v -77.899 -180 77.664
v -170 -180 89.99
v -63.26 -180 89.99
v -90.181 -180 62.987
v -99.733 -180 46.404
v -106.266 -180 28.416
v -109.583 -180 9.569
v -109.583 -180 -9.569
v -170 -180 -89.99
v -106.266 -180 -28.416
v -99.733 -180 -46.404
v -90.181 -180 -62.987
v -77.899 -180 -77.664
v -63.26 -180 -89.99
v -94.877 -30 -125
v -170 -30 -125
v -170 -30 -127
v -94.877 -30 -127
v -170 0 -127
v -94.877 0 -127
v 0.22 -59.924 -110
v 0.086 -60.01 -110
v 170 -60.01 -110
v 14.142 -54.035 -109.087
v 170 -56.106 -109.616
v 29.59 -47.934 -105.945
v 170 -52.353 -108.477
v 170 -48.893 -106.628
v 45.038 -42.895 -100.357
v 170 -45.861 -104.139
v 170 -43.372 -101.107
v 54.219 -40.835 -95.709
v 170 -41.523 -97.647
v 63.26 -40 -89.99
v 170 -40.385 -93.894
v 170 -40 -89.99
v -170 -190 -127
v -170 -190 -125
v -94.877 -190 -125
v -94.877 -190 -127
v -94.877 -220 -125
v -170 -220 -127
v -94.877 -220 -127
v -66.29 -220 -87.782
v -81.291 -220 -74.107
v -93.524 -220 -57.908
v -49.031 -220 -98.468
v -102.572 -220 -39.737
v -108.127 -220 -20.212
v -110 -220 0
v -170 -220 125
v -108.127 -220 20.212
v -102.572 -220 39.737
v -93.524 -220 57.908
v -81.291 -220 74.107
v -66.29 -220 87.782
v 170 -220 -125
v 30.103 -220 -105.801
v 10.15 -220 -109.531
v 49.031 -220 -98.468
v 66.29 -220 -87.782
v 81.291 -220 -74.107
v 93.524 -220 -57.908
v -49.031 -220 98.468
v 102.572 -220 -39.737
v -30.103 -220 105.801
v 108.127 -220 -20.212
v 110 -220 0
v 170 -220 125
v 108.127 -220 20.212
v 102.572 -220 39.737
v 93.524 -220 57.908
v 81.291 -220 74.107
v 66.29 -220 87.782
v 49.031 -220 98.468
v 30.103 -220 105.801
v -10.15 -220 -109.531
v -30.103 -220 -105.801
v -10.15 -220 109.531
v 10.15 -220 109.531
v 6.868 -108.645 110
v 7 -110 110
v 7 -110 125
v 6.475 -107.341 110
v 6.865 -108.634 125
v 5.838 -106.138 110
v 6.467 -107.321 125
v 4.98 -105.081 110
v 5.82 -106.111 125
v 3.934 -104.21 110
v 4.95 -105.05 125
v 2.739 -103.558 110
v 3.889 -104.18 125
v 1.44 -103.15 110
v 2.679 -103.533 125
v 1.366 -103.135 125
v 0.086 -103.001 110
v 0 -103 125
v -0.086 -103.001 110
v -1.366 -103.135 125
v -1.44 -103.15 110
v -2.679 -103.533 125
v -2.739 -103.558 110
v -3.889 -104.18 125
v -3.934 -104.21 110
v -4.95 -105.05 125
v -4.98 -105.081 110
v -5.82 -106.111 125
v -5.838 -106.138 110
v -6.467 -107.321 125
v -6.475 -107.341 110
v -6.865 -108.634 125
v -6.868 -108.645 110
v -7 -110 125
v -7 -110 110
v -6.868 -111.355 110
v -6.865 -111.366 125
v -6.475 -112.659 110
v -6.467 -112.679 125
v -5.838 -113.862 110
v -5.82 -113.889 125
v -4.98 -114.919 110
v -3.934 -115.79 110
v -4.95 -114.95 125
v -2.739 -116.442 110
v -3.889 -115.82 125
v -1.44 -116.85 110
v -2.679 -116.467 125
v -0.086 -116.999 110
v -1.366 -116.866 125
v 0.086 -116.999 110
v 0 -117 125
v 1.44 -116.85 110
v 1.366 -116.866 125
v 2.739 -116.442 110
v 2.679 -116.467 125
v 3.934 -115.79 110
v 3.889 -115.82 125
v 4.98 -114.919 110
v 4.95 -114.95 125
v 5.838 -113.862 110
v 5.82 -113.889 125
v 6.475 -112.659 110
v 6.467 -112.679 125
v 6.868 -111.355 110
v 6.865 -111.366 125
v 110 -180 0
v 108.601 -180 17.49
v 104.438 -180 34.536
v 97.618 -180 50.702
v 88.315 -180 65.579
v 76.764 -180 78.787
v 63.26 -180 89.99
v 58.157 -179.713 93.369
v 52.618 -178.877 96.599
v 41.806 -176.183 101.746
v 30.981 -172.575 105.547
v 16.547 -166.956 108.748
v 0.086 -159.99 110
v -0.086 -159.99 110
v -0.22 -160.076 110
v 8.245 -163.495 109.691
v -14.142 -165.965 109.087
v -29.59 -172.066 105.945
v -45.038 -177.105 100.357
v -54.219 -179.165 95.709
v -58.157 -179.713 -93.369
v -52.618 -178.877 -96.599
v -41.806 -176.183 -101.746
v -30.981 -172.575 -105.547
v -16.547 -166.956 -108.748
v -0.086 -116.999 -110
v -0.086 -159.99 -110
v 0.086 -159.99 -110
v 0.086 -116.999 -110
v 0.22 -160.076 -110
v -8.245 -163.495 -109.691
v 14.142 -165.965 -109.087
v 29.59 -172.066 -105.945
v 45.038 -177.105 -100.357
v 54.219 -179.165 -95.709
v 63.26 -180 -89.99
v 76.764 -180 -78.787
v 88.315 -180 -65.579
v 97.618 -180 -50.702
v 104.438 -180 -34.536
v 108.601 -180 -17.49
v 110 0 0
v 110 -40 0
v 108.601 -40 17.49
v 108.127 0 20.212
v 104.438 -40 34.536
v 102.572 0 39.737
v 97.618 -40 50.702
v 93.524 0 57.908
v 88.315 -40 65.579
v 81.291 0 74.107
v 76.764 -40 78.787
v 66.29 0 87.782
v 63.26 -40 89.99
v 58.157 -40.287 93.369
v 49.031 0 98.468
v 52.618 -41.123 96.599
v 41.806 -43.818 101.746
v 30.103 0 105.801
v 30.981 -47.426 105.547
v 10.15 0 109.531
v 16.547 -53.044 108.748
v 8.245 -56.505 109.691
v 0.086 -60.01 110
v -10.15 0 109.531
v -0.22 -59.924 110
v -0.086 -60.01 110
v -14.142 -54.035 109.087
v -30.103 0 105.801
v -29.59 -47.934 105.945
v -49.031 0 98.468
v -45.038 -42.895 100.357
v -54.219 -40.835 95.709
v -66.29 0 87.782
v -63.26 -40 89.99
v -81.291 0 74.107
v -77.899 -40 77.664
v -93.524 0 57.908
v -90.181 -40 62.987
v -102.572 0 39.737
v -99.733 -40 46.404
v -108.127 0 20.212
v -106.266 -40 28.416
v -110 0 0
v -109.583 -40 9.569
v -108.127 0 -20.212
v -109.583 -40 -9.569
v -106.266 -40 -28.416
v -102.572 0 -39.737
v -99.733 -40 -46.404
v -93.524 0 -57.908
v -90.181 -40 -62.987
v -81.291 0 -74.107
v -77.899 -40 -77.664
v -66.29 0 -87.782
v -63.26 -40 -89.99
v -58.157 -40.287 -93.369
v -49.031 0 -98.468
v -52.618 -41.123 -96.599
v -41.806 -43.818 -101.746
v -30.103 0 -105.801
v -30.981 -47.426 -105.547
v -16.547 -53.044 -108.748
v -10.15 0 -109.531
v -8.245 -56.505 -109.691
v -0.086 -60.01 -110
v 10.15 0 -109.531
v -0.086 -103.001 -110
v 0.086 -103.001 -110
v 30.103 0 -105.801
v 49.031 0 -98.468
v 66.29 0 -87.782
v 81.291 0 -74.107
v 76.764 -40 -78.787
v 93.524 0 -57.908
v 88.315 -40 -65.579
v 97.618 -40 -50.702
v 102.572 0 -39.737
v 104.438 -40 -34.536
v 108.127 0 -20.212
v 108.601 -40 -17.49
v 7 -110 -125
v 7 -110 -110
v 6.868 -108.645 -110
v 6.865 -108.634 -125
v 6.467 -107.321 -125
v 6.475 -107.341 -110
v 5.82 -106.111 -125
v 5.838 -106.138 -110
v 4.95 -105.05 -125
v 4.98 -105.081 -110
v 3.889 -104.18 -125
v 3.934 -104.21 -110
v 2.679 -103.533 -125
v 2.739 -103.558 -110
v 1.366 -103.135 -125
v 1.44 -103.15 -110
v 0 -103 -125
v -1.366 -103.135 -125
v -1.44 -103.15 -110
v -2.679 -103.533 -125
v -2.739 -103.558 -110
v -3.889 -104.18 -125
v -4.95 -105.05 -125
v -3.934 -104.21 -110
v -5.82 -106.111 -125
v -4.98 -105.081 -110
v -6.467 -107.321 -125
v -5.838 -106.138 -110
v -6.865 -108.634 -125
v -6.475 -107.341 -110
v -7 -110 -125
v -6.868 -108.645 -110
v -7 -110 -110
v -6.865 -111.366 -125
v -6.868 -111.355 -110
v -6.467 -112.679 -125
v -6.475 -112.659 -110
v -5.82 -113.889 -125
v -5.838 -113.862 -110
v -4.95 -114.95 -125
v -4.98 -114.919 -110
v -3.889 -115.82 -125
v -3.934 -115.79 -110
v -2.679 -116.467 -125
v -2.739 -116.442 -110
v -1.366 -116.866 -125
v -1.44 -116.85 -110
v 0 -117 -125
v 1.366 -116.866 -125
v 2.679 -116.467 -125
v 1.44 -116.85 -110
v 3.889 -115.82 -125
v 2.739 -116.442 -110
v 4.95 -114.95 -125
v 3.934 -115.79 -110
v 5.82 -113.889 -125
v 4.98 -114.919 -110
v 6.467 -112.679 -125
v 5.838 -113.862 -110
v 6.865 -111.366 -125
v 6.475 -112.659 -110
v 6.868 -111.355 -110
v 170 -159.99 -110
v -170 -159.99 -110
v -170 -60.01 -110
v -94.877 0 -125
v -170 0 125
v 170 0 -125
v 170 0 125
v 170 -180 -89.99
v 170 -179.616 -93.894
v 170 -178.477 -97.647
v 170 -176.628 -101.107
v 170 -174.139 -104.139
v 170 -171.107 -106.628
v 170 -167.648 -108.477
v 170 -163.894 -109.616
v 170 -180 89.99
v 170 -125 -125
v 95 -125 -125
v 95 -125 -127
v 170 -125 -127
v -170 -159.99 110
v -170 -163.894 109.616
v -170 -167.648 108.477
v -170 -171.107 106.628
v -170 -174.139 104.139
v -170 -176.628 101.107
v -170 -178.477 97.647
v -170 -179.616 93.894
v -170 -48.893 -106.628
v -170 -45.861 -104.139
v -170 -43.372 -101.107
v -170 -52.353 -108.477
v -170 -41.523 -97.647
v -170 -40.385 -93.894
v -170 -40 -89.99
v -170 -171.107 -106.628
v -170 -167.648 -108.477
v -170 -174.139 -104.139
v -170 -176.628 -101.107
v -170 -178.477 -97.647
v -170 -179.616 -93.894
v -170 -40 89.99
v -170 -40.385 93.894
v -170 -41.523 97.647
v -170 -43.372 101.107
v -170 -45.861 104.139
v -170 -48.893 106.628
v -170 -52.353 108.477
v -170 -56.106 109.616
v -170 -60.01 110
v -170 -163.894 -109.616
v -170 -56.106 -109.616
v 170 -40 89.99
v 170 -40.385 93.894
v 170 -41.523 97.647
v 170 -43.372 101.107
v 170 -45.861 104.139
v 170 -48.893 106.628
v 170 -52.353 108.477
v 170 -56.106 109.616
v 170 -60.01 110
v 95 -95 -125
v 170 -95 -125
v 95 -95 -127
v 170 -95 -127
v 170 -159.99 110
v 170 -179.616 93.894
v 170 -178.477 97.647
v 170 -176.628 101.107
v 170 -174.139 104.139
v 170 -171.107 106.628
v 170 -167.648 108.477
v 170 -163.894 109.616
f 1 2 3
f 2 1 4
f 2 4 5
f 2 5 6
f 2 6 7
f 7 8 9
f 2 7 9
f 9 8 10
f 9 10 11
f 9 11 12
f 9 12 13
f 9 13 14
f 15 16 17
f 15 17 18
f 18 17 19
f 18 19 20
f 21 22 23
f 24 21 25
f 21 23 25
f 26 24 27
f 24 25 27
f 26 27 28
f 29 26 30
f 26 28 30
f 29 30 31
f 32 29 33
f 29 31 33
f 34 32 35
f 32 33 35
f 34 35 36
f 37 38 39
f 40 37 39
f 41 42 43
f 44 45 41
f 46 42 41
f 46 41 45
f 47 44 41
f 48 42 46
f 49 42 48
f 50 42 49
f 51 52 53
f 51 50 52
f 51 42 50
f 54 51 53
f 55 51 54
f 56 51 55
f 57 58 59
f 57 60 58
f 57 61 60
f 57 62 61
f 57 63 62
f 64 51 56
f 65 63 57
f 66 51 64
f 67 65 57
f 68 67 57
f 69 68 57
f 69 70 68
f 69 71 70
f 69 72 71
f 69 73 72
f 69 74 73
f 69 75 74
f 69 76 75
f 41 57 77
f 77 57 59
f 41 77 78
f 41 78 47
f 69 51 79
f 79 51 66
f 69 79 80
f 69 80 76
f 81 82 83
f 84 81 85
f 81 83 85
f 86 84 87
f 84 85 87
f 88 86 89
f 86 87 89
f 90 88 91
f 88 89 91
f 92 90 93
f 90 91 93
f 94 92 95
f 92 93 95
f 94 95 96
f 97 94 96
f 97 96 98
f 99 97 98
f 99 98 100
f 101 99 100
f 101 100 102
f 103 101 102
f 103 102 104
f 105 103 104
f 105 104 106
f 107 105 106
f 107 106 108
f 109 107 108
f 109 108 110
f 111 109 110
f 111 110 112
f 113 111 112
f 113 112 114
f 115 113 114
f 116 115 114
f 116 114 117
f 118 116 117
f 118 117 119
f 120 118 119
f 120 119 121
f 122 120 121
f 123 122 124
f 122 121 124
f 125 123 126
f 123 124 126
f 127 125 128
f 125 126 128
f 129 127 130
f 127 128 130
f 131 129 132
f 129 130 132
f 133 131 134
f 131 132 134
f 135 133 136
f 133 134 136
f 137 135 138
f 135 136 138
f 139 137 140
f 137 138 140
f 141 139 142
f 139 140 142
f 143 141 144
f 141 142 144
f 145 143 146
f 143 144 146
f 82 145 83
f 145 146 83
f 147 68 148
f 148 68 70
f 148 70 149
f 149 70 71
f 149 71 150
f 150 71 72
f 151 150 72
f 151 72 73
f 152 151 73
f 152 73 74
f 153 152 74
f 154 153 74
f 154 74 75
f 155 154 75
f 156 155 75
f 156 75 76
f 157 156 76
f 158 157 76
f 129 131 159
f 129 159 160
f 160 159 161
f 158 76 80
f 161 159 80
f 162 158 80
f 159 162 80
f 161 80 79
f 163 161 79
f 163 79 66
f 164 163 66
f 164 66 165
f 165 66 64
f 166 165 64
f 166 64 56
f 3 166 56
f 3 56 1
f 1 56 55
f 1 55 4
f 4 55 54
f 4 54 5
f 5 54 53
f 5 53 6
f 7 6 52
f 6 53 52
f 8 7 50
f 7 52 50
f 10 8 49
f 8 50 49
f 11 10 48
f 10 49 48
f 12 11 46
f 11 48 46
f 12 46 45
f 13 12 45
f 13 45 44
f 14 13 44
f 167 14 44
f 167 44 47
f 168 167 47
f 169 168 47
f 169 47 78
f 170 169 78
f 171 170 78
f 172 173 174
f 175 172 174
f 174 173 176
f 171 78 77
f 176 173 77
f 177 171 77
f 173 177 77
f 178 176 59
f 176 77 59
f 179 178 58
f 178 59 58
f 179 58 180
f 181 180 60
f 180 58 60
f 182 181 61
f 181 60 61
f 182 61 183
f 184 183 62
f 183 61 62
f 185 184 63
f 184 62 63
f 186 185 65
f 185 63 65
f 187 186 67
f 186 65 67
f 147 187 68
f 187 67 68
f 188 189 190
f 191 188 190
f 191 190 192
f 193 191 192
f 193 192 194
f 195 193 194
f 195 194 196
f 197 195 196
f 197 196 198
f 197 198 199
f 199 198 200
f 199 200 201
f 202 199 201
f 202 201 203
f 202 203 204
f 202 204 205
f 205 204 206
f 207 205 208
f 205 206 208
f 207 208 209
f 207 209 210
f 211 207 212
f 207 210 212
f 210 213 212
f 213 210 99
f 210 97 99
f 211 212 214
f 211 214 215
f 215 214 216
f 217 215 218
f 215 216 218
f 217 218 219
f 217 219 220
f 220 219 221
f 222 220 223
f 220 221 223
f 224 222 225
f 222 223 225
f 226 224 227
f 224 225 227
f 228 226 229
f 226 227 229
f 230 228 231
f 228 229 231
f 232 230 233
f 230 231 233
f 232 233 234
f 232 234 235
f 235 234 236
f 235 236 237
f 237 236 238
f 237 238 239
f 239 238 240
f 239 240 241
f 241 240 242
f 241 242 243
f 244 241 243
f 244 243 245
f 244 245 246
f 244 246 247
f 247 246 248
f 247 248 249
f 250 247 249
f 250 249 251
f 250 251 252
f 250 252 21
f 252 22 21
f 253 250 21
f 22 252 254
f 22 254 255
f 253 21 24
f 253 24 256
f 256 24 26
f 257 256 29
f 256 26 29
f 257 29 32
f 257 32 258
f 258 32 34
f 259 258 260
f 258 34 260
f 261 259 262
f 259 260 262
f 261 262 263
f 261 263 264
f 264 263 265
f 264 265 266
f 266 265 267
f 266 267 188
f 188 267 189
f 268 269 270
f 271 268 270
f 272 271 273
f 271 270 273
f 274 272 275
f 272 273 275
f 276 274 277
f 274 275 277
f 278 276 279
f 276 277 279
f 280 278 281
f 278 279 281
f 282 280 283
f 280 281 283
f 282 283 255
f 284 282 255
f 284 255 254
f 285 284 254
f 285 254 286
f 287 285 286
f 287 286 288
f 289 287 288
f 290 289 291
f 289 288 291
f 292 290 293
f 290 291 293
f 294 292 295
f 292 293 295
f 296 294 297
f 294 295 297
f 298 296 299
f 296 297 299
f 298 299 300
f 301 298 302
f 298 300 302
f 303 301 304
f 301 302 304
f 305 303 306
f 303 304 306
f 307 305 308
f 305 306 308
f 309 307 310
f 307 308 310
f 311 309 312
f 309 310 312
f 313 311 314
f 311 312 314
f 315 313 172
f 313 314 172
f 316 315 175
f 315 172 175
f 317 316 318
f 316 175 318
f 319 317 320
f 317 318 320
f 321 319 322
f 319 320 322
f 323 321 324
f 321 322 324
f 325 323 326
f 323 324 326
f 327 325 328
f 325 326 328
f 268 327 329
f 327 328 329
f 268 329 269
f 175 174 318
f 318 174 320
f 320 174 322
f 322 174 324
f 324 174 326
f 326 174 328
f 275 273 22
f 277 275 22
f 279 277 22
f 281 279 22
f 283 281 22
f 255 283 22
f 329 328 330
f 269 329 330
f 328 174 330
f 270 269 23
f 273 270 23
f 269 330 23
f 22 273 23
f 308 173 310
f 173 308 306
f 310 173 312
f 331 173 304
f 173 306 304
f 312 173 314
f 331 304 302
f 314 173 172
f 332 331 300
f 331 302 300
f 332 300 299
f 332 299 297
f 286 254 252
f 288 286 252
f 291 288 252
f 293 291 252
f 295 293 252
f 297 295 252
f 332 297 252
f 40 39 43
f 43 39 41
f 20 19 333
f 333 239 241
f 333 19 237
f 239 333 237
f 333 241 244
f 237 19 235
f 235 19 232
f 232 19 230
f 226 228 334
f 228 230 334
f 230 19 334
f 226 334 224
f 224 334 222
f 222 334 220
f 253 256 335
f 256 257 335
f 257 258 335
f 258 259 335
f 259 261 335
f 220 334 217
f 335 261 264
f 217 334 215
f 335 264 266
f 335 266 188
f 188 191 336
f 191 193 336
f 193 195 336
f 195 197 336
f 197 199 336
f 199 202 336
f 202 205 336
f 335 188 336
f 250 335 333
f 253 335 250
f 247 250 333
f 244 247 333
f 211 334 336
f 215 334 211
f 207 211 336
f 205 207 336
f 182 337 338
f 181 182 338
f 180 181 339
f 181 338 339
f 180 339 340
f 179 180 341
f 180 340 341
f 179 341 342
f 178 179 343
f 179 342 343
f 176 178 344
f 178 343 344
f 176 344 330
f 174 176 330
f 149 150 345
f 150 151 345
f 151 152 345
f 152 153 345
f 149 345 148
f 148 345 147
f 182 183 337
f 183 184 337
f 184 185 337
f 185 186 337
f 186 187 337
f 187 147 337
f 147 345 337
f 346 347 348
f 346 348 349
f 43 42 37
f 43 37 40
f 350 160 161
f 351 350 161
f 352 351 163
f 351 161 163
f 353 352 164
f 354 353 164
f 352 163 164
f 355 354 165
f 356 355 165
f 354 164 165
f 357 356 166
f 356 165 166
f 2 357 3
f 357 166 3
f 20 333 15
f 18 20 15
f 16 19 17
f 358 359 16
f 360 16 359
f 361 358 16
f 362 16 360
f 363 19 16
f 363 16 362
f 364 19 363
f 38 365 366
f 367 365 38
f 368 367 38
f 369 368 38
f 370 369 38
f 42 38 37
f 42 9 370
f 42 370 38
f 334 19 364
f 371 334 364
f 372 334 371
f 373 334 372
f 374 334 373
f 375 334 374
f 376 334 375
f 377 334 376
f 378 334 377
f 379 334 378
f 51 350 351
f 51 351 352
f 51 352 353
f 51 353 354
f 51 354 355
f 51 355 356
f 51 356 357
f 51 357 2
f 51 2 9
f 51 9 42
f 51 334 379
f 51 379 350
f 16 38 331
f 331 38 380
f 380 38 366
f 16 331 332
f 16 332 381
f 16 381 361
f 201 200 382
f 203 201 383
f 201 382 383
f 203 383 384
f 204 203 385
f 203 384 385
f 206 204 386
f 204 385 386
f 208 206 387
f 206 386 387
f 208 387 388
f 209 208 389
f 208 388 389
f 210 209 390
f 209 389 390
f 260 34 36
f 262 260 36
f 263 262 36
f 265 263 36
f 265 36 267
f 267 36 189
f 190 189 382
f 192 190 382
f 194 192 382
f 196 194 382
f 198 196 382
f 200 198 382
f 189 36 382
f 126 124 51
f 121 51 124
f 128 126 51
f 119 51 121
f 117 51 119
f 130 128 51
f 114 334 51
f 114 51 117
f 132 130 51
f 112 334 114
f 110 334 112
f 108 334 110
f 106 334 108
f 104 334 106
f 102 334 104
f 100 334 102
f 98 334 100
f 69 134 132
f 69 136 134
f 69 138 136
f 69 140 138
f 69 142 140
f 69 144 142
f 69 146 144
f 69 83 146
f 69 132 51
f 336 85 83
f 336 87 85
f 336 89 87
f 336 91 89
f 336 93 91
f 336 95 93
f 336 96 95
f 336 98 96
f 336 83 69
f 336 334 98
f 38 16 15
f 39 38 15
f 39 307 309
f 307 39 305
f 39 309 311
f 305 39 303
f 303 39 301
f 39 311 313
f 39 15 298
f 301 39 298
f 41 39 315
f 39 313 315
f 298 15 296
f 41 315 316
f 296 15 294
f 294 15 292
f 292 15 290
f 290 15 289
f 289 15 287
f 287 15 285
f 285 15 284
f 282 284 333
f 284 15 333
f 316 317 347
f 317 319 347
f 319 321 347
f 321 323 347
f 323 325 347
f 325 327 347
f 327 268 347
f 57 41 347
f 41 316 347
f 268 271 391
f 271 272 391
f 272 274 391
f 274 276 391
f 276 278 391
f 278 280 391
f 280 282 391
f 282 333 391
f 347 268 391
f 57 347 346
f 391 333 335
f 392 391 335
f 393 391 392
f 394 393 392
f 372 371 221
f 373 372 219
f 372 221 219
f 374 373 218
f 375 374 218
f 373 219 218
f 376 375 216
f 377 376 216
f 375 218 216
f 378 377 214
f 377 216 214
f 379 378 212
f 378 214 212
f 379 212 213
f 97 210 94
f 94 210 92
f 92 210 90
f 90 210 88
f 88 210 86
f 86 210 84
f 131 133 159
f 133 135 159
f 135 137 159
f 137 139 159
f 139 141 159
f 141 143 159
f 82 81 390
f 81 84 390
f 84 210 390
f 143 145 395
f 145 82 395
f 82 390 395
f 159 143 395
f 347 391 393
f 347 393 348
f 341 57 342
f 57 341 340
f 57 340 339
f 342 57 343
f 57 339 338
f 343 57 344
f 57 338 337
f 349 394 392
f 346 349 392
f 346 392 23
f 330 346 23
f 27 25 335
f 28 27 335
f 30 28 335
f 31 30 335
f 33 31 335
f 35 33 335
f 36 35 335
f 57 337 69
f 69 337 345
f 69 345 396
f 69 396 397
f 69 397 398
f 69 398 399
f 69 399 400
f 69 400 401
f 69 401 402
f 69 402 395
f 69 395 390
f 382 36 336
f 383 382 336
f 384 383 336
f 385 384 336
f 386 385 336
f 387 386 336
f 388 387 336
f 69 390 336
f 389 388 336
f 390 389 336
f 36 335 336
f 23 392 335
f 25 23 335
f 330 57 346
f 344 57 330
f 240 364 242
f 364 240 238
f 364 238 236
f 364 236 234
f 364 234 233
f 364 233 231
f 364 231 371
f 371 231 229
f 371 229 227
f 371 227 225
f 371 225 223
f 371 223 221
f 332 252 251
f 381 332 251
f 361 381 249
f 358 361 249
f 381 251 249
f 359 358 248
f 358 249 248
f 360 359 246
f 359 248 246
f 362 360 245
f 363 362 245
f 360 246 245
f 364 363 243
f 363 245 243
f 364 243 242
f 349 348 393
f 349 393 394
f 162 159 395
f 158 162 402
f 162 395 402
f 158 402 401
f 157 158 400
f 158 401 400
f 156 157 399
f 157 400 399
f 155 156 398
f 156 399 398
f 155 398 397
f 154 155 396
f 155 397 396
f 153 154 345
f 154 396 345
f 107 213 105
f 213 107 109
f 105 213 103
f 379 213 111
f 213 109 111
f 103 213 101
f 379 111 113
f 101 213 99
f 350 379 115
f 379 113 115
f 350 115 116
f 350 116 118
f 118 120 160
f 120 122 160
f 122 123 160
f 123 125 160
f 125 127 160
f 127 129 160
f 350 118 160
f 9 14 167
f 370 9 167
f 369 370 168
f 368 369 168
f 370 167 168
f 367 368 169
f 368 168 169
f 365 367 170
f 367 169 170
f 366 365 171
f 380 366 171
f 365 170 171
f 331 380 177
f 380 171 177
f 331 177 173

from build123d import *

# Parameters (mm, degrees)
F0_W      = 340
F0_H      = 250
F1_DEPTH  = 220
F3_DEPTH  = 340
F4_R      = 110.000034
F5_DEPTH  = 228.6
F6_R      = 6.999986
F7_DEPTH  = 304.8
F8_W      = 75.12304
F8_H      = 29.99994
F9_DEPTH  = 2
F10_W     = 75
F10_H     = 30
F11_DEPTH = 2


with BuildPart() as f1:
    # F0 (on Front) → F1 (new body)
    with BuildSketch(Plane.XZ):
        Rectangle(F0_W, F0_H)
    extrude(amount=F1_DEPTH)

    # F2 (on face) → F3 (cut)
    with BuildSketch(Plane.YZ.offset(170)):
        with BuildLine():
            ThreePointArc((-40.00008, 89.98988), (-45.860908, 104.139172), (-60.0102, 110))
            Line((-60.0102, 110), (-159.98996, 110))
            ThreePointArc((-159.98996, 110), (-174.139252, 104.139172), (-180.00008, 89.98988))
            Line((-180.00008, 89.98988), (-180.00008, -89.98988))
            ThreePointArc((-180.00008, -89.98988), (-174.139252, -104.139172), (-159.98996, -110))
            Line((-159.98996, -110), (-60.0102, -110))
            ThreePointArc((-60.0102, -110), (-45.860908, -104.139172), (-40.00008, -89.98988))
            Line((-40.00008, -89.98988), (-40.00008, 89.98988))
        make_face()
    extrude(amount=-F3_DEPTH, mode=Mode.SUBTRACT)

    # F4 (on face) → F5 (cut)
    with BuildSketch(Plane.XZ.offset(220)):
        Circle(F4_R)
    extrude(amount=-F5_DEPTH, mode=Mode.SUBTRACT)

    # F6 (on face) → F7 (cut)
    with BuildSketch(Plane.XY.offset(125)):
        with Locations((0, -110.000034)):
            Circle(F6_R)
    extrude(amount=-F7_DEPTH, mode=Mode.SUBTRACT)

    # F8 (on face) → F9 (join)
    with BuildSketch(Plane(origin=(0, 0, -125), x_dir=(1, 0, 0), z_dir=(0, 0, -1))):
        with Locations((-132.43848, 205.00003)):
            Rectangle(F8_W, F8_H)
        with Locations((-132.43848, 14.99997)):
            Rectangle(F8_W, F8_H)
    extrude(amount=F9_DEPTH)

    # F10 (on face) → F11 (join)
    with BuildSketch(Plane(origin=(0, 0, -125), x_dir=(1, 0, 0), z_dir=(0, 0, -1))):
        with Locations((132.5, 110)):
            Rectangle(F10_W, F10_H)
    extrude(amount=F11_DEPTH)


solid = f1.part
